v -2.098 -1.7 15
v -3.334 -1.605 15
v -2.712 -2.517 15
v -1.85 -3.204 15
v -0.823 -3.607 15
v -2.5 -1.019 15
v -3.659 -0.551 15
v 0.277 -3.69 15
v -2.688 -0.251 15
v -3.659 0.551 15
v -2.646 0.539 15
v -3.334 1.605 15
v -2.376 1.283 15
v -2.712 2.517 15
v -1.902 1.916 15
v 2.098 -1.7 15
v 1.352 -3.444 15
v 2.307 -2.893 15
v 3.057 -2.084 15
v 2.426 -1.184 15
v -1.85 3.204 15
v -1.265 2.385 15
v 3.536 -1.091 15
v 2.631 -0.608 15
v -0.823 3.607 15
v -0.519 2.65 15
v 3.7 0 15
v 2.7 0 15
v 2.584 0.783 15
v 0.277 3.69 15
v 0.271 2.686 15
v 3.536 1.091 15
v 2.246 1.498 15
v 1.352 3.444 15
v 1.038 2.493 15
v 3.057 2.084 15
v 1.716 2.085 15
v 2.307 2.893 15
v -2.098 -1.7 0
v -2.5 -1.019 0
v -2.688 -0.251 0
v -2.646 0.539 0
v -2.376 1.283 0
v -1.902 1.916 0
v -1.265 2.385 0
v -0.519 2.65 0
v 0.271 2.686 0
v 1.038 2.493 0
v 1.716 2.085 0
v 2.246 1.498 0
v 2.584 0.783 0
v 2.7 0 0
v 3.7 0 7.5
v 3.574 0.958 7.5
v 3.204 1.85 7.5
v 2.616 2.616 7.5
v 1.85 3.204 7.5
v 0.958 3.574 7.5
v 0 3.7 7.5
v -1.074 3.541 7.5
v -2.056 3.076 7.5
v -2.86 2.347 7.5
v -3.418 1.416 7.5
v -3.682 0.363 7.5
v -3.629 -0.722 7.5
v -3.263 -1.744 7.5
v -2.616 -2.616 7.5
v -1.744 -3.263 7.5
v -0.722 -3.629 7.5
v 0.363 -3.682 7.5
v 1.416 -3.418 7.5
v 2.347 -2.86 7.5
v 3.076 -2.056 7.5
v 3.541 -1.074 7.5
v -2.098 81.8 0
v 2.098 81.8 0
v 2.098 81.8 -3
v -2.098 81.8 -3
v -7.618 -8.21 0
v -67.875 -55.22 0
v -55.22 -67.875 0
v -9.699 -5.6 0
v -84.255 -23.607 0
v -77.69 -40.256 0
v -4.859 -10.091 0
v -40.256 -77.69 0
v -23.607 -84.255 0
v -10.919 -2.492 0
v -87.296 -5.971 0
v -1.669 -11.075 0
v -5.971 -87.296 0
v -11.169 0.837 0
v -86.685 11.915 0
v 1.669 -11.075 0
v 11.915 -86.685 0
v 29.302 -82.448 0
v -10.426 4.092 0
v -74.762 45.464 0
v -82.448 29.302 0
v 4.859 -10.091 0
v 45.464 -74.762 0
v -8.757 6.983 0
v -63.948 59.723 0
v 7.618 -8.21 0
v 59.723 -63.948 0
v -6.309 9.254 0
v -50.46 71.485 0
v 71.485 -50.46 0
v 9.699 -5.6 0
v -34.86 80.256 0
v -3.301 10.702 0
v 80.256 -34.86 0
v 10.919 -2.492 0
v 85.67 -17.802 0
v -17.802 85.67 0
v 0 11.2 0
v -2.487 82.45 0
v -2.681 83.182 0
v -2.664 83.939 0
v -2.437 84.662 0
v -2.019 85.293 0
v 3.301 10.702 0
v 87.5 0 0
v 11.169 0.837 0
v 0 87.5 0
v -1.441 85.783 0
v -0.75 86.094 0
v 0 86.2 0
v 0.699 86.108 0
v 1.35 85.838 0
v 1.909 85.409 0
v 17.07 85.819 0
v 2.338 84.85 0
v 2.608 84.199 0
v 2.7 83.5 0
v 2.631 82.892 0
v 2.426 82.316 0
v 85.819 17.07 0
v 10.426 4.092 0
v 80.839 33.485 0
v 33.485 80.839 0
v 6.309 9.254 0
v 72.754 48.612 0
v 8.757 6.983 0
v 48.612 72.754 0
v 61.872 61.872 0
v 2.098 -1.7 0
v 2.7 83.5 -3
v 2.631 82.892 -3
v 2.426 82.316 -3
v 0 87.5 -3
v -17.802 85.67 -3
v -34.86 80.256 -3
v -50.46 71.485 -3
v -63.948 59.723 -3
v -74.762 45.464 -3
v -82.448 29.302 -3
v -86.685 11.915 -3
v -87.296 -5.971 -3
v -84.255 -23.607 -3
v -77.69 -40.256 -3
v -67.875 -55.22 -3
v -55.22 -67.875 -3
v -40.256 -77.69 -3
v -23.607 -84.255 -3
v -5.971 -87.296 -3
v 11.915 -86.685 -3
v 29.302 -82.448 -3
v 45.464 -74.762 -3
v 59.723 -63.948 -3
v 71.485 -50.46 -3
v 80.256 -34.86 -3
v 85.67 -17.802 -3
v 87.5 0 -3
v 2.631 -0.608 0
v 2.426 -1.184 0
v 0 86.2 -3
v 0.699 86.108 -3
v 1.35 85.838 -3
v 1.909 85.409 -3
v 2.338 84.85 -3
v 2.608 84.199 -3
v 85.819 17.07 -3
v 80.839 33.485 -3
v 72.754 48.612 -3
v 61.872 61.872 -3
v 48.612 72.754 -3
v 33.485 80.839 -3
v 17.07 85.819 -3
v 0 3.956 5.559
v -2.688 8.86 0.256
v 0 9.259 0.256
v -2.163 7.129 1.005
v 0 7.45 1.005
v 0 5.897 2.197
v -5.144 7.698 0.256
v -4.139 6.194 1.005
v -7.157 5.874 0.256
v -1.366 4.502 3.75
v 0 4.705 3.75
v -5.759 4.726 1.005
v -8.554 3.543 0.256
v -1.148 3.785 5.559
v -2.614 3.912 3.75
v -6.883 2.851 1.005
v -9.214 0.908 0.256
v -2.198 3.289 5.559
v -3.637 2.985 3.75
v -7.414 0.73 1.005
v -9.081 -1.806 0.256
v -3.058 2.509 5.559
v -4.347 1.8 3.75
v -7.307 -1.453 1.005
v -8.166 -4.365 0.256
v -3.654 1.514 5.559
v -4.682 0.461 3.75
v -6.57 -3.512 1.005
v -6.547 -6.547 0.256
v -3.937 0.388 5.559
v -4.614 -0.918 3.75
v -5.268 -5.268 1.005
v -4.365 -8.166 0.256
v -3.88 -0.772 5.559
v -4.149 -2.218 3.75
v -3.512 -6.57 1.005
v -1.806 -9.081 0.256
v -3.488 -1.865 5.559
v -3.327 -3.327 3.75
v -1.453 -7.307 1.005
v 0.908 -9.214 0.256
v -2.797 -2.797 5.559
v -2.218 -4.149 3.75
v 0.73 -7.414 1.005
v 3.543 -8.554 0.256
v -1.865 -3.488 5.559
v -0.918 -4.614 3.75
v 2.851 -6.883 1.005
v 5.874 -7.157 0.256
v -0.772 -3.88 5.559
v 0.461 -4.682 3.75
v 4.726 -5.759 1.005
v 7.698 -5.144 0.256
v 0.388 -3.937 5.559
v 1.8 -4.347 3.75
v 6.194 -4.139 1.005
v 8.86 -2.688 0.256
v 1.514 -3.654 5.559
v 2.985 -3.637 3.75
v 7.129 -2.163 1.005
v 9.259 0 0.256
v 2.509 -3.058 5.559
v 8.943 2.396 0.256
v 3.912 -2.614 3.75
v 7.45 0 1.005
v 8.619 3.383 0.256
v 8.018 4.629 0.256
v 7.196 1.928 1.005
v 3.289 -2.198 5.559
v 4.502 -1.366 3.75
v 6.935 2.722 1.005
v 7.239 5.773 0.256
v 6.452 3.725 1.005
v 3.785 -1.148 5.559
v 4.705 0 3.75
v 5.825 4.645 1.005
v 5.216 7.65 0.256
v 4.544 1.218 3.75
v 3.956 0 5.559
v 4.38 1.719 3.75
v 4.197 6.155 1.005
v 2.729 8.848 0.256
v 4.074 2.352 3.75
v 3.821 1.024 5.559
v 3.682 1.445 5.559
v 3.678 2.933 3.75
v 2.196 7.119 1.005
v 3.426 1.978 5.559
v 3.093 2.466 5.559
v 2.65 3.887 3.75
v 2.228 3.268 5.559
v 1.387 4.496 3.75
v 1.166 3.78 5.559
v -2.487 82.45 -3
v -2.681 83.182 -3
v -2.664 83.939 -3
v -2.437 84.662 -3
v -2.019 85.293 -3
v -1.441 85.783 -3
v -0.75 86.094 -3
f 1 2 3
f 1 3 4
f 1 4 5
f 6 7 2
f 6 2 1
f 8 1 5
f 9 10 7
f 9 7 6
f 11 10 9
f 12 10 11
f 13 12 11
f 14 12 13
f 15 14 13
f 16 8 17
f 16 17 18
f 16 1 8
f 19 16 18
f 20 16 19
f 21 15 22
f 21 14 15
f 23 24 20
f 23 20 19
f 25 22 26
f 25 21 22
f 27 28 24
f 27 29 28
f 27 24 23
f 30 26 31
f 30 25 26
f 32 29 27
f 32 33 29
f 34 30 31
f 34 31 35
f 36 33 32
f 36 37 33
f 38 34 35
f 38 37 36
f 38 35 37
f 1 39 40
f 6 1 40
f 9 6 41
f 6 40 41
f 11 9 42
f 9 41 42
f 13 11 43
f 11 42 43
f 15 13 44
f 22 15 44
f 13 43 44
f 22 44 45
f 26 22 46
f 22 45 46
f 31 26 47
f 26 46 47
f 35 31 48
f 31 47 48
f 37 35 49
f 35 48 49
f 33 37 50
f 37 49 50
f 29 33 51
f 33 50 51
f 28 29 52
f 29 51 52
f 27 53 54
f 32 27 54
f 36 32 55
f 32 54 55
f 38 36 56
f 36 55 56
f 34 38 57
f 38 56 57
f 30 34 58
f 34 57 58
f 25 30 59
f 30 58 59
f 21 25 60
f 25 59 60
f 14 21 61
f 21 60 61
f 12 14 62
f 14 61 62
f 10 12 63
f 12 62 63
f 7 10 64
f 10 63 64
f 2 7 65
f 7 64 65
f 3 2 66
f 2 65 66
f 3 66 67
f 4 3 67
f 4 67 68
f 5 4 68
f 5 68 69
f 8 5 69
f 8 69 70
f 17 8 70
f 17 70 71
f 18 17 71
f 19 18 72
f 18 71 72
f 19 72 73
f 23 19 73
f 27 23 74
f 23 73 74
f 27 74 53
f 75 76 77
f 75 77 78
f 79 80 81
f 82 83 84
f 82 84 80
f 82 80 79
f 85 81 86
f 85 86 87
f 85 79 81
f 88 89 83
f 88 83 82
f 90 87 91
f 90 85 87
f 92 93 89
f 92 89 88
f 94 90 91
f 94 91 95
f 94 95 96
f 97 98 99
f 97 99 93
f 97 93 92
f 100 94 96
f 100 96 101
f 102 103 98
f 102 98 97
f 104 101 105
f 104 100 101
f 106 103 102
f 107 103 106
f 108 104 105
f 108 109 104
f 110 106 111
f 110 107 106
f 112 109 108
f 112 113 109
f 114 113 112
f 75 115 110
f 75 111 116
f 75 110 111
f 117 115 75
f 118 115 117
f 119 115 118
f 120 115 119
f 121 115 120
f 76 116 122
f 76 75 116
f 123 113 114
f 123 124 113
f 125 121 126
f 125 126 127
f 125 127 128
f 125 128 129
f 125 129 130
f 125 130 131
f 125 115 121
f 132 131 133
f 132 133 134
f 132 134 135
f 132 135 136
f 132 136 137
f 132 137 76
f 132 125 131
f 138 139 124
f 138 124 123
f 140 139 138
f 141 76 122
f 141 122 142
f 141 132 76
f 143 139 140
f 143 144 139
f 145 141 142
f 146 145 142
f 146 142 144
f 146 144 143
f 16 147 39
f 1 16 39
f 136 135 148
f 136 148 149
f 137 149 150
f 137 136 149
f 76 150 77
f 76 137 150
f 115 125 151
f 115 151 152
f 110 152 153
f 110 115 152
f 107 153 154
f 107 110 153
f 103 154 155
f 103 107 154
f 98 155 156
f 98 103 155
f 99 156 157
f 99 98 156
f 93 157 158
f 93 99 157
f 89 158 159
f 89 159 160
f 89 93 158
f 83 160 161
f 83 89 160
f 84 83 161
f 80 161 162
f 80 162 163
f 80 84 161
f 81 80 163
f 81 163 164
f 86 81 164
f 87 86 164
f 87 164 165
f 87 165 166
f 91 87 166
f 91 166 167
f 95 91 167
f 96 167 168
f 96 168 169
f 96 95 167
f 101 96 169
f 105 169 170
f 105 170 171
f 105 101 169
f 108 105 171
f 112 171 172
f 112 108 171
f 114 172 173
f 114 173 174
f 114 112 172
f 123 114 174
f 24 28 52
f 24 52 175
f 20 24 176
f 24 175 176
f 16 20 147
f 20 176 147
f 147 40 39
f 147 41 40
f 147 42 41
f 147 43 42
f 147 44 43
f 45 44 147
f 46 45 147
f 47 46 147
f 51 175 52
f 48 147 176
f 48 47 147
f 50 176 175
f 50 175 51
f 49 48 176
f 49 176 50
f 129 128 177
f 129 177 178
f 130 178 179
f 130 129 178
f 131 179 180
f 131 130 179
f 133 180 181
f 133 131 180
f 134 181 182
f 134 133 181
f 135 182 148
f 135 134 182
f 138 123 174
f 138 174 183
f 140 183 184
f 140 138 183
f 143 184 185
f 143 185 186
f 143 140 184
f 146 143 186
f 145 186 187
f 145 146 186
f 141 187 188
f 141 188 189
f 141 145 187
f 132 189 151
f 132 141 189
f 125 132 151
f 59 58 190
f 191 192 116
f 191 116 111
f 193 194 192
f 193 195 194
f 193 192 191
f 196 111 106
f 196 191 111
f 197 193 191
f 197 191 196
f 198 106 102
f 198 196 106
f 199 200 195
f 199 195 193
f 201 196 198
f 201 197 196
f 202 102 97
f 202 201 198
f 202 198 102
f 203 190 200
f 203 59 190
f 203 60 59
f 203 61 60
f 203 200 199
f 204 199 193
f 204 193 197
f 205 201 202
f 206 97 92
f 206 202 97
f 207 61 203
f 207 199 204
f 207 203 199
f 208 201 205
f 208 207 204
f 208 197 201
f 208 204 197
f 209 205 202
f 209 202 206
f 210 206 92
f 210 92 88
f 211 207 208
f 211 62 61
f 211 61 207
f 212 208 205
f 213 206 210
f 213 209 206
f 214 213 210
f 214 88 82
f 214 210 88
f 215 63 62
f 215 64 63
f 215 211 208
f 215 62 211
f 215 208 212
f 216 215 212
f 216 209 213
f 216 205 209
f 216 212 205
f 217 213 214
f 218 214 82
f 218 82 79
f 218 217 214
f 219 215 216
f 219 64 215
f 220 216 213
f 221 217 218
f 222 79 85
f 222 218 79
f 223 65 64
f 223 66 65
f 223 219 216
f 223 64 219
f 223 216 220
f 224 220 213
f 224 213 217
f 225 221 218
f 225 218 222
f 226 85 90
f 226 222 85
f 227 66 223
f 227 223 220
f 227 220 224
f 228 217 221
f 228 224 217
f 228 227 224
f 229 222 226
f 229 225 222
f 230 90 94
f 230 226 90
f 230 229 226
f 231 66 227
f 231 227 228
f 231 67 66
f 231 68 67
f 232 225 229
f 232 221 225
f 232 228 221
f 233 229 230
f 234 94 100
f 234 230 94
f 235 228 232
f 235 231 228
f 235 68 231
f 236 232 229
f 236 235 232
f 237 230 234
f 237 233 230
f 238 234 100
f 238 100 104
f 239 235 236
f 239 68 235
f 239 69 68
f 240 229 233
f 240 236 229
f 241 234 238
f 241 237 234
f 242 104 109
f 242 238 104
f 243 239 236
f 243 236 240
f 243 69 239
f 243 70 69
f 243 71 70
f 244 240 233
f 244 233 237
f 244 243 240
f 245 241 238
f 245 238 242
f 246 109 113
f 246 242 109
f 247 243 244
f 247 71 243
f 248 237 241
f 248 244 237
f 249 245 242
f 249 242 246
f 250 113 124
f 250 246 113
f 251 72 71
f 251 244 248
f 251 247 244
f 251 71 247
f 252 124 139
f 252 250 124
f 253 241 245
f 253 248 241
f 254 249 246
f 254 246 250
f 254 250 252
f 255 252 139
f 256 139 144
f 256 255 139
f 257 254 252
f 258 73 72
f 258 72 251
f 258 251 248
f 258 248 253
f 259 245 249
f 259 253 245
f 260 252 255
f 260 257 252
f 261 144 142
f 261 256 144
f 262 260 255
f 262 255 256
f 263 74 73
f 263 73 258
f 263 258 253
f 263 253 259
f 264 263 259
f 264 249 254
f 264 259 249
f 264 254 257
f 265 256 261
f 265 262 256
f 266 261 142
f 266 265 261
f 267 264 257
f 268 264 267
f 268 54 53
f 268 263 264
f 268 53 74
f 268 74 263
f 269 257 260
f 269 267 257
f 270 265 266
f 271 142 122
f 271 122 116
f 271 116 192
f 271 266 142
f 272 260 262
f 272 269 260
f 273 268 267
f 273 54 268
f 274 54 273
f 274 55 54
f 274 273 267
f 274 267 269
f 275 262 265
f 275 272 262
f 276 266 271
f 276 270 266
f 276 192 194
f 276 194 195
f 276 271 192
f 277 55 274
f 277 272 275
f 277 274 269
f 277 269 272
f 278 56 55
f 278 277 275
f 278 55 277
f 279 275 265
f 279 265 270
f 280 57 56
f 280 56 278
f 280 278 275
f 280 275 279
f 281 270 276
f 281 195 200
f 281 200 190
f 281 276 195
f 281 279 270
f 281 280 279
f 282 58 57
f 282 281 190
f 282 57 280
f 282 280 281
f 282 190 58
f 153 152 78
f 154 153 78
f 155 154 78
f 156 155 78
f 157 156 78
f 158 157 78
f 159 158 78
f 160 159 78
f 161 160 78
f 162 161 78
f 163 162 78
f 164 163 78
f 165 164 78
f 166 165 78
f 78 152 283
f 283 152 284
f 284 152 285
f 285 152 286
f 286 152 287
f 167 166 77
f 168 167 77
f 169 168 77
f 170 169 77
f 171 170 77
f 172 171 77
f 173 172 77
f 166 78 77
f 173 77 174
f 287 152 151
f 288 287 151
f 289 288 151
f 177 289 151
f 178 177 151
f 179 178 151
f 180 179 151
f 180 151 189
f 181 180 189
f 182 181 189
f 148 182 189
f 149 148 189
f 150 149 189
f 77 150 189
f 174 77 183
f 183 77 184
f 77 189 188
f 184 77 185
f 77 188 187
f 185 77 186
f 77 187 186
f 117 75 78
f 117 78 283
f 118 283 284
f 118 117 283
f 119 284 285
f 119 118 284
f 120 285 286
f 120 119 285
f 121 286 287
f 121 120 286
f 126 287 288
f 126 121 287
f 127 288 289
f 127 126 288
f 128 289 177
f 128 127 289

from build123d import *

# Parameters (mm, degrees)
F0_R     = 3.7
F1_DEPTH = 15
F3_DEPTH = 3


with BuildPart() as f1:
    # F0 (on Top) → F1 (new body)
    with BuildSketch(Plane.XY):
        Circle(F0_R)
        with BuildLine():
            ThreePointArc((-2.0976176963, -1.7), (-0.9017849577, 2.5449526302), (2.7, 0))
            ThreePointArc((2.7, 0), (2.5449526302, -0.9017849577), (2.0976176963, -1.7))
            ThreePointArc((2.0976176963, -1.7), (0, -2.7), (-2.0976176963, -1.7))
        make_face(mode=Mode.SUBTRACT)
        with BuildLine():
            Line((0, -1.7), (-2.0976176963, -1.7))
            ThreePointArc((-2.0976176963, -1.7), (0, -2.7), (2.0976176963, -1.7))
            Line((2.0976176963, -1.7), (0, -1.7))
        make_face()
    extrude(amount=F1_DEPTH)

    # F2 (on Top) → F3 (join)
    with BuildSketch(Plane.XY):
        with BuildLine():
            ThreePointArc((0, 87.5), (-61.8718433538, -61.8718433538), (87.5, 0))
            ThreePointArc((87.5, 0), (61.8718433538, 61.8718433538), (0, 87.5))
        make_face()
        with BuildLine():
            ThreePointArc((-2.0976176963, 81.8), (-2.4372115214, 84.6618950039), (0, 86.2))
            ThreePointArc((0, 86.2), (1.9091883092, 85.4091883092), (2.7, 83.5))
            ThreePointArc((2.7, 83.5), (2.5449526302, 82.5982150423), (2.0976176963, 81.8))
            ThreePointArc((2.0976176963, 81.8), (1.1618950039, 81.0627884786), (0, 80.8))
            ThreePointArc((0, 80.8), (-1.1618950039, 81.0627884786), (-2.0976176963, 81.8))
        make_face(mode=Mode.SUBTRACT)
        with BuildLine():
            Line((0, 81.8), (-2.0976176963, 81.8))
            ThreePointArc((-2.0976176963, 81.8), (-1.1618950039, 81.0627884786), (0, 80.8))
            Line((0, 80.8), (0, 81.8))
        make_face()
        with BuildLine():
            Line((2.0976176963, 81.8), (0, 81.8))
            Line((0, 81.8), (0, 80.8))
            ThreePointArc((0, 80.8), (1.1618950039, 81.0627884786), (2.0976176963, 81.8))
        make_face()
    extrude(amount=-F3_DEPTH)

    # F4 (on Right) → F5 (revolve)
    with BuildSketch(Plane.YZ):
        with BuildLine():
            Line((3.7, 7.5), (3.7, 0))
            Line((3.7, 0), (11.2, 0))
            ThreePointArc((11.2, 0), (5.8966991411, 2.1966991411), (3.7, 7.5))
        make_face()
    revolve(axis=Axis((0, 0, 3.75), (0, 0, 1)))


solid = f1.part
